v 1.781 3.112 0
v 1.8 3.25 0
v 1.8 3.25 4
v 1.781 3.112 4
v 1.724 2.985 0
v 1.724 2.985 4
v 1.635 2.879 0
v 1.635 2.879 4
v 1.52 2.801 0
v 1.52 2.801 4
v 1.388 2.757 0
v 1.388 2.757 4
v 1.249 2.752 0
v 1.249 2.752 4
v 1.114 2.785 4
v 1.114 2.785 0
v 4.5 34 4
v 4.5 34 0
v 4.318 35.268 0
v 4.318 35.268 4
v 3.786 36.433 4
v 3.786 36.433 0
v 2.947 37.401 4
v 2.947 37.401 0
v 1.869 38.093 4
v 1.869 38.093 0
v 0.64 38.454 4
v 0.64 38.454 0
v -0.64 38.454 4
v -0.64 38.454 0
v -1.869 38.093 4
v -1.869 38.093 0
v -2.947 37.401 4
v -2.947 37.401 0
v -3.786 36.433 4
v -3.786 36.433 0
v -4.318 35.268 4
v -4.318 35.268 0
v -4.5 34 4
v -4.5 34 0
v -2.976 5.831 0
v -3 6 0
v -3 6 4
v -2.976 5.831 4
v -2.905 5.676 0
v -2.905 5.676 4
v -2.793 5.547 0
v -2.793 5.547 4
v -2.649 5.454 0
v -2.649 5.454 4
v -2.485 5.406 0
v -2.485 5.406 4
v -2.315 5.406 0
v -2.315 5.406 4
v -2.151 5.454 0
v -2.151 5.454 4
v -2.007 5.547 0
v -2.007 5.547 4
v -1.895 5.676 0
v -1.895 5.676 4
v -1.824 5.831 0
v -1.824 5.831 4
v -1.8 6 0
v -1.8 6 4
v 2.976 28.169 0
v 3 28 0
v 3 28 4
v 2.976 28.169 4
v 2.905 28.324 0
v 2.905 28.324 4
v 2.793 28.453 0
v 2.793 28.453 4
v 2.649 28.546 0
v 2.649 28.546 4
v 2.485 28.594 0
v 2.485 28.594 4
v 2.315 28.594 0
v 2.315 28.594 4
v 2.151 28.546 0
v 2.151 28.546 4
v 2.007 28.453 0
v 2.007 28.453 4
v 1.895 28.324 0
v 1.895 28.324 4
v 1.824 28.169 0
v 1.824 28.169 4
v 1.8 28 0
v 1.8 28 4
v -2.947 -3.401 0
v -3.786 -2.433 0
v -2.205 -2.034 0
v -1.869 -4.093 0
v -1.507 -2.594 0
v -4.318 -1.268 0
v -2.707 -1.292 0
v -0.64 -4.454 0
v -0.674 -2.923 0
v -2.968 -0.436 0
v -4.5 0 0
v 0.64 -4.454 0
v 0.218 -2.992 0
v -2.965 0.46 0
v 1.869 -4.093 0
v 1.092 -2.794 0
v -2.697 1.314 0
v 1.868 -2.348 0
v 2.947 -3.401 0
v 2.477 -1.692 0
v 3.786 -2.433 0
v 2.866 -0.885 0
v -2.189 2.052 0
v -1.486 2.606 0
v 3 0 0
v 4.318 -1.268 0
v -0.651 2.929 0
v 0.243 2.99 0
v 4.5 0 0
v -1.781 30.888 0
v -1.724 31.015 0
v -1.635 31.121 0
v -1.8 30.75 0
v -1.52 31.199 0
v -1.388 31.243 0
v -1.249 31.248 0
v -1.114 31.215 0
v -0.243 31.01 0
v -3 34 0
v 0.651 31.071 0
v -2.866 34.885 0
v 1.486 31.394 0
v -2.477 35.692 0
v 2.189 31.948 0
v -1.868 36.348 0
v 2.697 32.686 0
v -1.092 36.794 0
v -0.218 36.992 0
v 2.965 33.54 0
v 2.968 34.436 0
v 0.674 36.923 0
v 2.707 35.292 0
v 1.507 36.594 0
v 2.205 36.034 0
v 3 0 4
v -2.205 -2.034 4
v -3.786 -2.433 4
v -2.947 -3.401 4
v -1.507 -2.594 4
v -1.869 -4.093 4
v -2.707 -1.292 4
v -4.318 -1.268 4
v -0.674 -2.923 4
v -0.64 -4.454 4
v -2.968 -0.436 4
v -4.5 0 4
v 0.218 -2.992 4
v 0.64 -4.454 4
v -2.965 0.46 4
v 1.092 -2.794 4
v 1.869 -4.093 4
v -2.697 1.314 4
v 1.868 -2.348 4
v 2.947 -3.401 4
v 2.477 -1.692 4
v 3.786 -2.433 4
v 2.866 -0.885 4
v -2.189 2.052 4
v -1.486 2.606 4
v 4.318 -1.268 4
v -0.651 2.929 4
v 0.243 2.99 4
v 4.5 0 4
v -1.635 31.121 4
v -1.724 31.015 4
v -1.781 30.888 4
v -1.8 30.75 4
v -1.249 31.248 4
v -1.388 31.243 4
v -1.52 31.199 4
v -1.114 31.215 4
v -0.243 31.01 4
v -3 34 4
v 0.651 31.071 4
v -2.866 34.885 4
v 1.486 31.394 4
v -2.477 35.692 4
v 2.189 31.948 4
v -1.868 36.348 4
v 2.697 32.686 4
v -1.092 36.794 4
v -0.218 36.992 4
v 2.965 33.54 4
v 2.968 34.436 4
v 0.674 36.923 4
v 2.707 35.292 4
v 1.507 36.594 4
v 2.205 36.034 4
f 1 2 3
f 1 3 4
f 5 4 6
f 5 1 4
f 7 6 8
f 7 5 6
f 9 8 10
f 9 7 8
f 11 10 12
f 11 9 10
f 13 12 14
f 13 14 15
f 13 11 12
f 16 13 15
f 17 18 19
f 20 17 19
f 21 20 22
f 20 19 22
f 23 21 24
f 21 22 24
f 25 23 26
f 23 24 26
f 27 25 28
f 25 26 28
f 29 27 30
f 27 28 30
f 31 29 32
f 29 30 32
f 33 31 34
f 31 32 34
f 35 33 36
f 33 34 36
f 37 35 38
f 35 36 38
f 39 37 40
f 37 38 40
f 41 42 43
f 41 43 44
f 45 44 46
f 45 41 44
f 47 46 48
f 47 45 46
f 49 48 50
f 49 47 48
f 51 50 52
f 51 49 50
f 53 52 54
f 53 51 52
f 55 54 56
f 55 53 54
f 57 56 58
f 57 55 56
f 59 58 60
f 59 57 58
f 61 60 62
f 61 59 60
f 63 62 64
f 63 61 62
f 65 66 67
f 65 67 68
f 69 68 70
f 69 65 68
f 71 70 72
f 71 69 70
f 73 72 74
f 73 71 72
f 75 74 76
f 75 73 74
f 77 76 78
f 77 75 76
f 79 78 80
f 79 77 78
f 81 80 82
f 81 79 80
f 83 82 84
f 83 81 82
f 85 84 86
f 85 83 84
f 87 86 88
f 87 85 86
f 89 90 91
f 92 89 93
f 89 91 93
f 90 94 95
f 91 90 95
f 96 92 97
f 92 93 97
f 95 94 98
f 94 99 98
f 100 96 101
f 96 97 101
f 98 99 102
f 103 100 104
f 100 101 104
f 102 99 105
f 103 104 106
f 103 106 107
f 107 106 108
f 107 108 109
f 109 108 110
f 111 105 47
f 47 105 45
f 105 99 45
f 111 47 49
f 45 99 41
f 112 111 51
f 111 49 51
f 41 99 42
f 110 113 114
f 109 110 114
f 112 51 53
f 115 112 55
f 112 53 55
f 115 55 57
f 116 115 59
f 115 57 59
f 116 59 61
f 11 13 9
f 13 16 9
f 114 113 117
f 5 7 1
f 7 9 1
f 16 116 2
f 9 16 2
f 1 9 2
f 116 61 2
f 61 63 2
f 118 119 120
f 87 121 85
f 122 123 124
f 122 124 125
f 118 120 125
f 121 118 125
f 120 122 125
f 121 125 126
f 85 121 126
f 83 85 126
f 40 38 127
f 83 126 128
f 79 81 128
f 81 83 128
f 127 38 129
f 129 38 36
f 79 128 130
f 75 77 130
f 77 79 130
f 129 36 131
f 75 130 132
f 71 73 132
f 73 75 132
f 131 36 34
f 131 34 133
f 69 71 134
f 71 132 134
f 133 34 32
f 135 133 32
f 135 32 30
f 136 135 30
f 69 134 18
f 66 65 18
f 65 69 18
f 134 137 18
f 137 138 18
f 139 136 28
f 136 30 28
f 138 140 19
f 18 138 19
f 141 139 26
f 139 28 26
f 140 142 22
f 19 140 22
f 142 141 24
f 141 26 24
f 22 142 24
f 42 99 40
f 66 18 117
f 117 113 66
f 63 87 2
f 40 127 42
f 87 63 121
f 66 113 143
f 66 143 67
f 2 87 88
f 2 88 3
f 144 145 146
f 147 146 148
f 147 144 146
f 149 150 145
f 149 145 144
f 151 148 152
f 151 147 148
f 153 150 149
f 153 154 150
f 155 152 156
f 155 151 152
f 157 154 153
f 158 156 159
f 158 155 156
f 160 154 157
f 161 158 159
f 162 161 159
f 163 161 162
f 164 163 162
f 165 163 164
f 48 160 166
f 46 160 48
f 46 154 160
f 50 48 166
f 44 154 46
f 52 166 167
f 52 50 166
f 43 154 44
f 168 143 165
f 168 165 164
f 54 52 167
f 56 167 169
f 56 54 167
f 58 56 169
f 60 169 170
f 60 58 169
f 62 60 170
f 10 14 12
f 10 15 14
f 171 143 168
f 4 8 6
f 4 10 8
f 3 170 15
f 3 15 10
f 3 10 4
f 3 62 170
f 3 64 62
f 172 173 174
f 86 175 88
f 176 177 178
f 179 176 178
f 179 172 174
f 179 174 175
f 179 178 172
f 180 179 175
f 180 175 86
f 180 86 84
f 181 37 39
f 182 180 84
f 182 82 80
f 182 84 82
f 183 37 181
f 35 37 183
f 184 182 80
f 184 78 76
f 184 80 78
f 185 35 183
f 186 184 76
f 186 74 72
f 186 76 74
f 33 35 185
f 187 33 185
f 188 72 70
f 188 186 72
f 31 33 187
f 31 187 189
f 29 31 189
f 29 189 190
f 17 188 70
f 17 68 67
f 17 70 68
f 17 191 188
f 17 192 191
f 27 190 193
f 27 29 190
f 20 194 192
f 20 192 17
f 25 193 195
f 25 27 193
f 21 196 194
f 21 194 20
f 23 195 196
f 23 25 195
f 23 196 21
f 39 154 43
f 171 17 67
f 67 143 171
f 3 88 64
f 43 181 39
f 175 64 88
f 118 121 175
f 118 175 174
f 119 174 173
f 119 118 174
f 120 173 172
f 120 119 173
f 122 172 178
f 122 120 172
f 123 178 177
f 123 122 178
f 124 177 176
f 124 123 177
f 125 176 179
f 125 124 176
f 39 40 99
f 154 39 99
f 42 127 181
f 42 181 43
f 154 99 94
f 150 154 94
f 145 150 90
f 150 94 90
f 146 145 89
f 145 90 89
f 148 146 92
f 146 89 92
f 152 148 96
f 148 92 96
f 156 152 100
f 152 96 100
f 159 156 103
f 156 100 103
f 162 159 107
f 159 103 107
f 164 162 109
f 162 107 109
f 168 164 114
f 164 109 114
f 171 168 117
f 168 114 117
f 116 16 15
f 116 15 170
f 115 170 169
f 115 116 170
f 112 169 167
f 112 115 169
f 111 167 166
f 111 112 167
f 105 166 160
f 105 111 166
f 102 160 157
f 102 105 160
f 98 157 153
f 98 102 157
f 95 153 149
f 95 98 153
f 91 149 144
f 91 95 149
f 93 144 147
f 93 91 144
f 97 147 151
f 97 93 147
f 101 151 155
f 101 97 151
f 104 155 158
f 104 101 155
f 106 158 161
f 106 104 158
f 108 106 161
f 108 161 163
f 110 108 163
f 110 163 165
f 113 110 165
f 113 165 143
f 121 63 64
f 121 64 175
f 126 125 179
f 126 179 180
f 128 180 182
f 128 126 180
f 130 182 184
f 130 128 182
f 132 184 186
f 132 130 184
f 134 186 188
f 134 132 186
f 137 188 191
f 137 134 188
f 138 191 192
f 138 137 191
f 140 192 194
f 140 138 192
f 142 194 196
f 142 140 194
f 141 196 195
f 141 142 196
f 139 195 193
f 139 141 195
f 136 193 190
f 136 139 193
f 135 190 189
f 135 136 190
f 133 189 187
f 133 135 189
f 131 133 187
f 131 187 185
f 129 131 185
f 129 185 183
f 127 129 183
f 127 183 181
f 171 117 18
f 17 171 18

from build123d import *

# Parameters (mm, degrees)
EXTRUDE_1_DEPTH = 4


with BuildPart() as part:
    # 草图1 → 凸台-拉伸1 (new body)
    with BuildSketch(Plane.XY):
        with BuildLine():
            Line((-4.5, 34), (-4.5, 0))
            ThreePointArc((-4.5, 0), (0, -4.5), (4.5, 0))
            Line((4.5, 0), (4.5, 34))
            ThreePointArc((4.5, 34), (0, 38.5), (-4.5, 34))
        make_face()
        with BuildLine():
            Line((-3, 34), (-3, 6))
            ThreePointArc((-3, 6), (-2.4, 5.4), (-1.8, 6))
            Line((-1.8, 6), (-1.8, 30.750384638))
            ThreePointArc((-1.8, 30.750384638), (-1.580305955, 31.164423974), (-1.114285714, 31.214615404))
            ThreePointArc((-1.114285714, 31.214615404), (2.484236014, 35.681835732), (-3, 34))
        make_face(mode=Mode.SUBTRACT)
        with BuildLine():
            Line((3, 0), (3, 28))
            ThreePointArc((3, 28), (2.4, 28.6), (1.8, 28))
            Line((1.8, 28), (1.8, 3.249615362))
            ThreePointArc((1.8, 3.249615362), (1.580305955, 2.835576026), (1.114285714, 2.785384596))
            ThreePointArc((1.114285714, 2.785384596), (-2.484236014, -1.681835732), (3, 0))
        make_face(mode=Mode.SUBTRACT)
    extrude(amount=EXTRUDE_1_DEPTH)


solid = part.part
